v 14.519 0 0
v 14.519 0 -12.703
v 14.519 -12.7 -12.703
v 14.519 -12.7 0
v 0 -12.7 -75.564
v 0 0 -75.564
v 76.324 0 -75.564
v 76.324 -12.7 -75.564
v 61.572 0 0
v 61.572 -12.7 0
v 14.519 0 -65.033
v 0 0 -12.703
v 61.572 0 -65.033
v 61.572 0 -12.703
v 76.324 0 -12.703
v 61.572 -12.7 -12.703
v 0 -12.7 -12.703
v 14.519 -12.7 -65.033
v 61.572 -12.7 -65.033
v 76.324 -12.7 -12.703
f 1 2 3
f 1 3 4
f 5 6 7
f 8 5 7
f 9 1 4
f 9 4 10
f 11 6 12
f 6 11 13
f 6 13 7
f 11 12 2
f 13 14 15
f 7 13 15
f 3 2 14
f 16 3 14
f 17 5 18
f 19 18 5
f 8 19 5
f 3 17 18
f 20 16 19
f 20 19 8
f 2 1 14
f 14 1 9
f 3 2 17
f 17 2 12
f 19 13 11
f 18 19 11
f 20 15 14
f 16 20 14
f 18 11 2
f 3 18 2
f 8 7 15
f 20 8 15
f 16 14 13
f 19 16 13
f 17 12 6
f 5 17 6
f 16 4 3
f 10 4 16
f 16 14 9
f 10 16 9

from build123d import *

# Parameters (mm, degrees)
F1_DEPTH = 12.7
F0_W     = 47.0529291779
F0_H     = 12.7030676231


with BuildPart() as f1:
    # F0 (on Front) → F1 (new body)
    with BuildSketch(Plane.XZ):
        Polygon((14.5189296454, -12.7030676231), (0, -12.7030676231), (0, -75.563699007), (76.3243660331, -75.563699007), (76.3243660331, -12.7030676231), (61.5718588233, -12.7030676231), (61.5718588233, -65.0329515338), (14.5189296454, -65.0329515338), align=None)
    extrude(amount=F1_DEPTH)


with BuildPart() as f1b:
    # F0 (on Front) → F1, piece 2 (new body)
    with BuildSketch(Plane.XZ):
        with Locations((38.0453942344, -6.3515338115)):
            Rectangle(F0_W, F0_H)
    extrude(amount=F1_DEPTH)


solid = Compound([f1.part, f1b.part])
